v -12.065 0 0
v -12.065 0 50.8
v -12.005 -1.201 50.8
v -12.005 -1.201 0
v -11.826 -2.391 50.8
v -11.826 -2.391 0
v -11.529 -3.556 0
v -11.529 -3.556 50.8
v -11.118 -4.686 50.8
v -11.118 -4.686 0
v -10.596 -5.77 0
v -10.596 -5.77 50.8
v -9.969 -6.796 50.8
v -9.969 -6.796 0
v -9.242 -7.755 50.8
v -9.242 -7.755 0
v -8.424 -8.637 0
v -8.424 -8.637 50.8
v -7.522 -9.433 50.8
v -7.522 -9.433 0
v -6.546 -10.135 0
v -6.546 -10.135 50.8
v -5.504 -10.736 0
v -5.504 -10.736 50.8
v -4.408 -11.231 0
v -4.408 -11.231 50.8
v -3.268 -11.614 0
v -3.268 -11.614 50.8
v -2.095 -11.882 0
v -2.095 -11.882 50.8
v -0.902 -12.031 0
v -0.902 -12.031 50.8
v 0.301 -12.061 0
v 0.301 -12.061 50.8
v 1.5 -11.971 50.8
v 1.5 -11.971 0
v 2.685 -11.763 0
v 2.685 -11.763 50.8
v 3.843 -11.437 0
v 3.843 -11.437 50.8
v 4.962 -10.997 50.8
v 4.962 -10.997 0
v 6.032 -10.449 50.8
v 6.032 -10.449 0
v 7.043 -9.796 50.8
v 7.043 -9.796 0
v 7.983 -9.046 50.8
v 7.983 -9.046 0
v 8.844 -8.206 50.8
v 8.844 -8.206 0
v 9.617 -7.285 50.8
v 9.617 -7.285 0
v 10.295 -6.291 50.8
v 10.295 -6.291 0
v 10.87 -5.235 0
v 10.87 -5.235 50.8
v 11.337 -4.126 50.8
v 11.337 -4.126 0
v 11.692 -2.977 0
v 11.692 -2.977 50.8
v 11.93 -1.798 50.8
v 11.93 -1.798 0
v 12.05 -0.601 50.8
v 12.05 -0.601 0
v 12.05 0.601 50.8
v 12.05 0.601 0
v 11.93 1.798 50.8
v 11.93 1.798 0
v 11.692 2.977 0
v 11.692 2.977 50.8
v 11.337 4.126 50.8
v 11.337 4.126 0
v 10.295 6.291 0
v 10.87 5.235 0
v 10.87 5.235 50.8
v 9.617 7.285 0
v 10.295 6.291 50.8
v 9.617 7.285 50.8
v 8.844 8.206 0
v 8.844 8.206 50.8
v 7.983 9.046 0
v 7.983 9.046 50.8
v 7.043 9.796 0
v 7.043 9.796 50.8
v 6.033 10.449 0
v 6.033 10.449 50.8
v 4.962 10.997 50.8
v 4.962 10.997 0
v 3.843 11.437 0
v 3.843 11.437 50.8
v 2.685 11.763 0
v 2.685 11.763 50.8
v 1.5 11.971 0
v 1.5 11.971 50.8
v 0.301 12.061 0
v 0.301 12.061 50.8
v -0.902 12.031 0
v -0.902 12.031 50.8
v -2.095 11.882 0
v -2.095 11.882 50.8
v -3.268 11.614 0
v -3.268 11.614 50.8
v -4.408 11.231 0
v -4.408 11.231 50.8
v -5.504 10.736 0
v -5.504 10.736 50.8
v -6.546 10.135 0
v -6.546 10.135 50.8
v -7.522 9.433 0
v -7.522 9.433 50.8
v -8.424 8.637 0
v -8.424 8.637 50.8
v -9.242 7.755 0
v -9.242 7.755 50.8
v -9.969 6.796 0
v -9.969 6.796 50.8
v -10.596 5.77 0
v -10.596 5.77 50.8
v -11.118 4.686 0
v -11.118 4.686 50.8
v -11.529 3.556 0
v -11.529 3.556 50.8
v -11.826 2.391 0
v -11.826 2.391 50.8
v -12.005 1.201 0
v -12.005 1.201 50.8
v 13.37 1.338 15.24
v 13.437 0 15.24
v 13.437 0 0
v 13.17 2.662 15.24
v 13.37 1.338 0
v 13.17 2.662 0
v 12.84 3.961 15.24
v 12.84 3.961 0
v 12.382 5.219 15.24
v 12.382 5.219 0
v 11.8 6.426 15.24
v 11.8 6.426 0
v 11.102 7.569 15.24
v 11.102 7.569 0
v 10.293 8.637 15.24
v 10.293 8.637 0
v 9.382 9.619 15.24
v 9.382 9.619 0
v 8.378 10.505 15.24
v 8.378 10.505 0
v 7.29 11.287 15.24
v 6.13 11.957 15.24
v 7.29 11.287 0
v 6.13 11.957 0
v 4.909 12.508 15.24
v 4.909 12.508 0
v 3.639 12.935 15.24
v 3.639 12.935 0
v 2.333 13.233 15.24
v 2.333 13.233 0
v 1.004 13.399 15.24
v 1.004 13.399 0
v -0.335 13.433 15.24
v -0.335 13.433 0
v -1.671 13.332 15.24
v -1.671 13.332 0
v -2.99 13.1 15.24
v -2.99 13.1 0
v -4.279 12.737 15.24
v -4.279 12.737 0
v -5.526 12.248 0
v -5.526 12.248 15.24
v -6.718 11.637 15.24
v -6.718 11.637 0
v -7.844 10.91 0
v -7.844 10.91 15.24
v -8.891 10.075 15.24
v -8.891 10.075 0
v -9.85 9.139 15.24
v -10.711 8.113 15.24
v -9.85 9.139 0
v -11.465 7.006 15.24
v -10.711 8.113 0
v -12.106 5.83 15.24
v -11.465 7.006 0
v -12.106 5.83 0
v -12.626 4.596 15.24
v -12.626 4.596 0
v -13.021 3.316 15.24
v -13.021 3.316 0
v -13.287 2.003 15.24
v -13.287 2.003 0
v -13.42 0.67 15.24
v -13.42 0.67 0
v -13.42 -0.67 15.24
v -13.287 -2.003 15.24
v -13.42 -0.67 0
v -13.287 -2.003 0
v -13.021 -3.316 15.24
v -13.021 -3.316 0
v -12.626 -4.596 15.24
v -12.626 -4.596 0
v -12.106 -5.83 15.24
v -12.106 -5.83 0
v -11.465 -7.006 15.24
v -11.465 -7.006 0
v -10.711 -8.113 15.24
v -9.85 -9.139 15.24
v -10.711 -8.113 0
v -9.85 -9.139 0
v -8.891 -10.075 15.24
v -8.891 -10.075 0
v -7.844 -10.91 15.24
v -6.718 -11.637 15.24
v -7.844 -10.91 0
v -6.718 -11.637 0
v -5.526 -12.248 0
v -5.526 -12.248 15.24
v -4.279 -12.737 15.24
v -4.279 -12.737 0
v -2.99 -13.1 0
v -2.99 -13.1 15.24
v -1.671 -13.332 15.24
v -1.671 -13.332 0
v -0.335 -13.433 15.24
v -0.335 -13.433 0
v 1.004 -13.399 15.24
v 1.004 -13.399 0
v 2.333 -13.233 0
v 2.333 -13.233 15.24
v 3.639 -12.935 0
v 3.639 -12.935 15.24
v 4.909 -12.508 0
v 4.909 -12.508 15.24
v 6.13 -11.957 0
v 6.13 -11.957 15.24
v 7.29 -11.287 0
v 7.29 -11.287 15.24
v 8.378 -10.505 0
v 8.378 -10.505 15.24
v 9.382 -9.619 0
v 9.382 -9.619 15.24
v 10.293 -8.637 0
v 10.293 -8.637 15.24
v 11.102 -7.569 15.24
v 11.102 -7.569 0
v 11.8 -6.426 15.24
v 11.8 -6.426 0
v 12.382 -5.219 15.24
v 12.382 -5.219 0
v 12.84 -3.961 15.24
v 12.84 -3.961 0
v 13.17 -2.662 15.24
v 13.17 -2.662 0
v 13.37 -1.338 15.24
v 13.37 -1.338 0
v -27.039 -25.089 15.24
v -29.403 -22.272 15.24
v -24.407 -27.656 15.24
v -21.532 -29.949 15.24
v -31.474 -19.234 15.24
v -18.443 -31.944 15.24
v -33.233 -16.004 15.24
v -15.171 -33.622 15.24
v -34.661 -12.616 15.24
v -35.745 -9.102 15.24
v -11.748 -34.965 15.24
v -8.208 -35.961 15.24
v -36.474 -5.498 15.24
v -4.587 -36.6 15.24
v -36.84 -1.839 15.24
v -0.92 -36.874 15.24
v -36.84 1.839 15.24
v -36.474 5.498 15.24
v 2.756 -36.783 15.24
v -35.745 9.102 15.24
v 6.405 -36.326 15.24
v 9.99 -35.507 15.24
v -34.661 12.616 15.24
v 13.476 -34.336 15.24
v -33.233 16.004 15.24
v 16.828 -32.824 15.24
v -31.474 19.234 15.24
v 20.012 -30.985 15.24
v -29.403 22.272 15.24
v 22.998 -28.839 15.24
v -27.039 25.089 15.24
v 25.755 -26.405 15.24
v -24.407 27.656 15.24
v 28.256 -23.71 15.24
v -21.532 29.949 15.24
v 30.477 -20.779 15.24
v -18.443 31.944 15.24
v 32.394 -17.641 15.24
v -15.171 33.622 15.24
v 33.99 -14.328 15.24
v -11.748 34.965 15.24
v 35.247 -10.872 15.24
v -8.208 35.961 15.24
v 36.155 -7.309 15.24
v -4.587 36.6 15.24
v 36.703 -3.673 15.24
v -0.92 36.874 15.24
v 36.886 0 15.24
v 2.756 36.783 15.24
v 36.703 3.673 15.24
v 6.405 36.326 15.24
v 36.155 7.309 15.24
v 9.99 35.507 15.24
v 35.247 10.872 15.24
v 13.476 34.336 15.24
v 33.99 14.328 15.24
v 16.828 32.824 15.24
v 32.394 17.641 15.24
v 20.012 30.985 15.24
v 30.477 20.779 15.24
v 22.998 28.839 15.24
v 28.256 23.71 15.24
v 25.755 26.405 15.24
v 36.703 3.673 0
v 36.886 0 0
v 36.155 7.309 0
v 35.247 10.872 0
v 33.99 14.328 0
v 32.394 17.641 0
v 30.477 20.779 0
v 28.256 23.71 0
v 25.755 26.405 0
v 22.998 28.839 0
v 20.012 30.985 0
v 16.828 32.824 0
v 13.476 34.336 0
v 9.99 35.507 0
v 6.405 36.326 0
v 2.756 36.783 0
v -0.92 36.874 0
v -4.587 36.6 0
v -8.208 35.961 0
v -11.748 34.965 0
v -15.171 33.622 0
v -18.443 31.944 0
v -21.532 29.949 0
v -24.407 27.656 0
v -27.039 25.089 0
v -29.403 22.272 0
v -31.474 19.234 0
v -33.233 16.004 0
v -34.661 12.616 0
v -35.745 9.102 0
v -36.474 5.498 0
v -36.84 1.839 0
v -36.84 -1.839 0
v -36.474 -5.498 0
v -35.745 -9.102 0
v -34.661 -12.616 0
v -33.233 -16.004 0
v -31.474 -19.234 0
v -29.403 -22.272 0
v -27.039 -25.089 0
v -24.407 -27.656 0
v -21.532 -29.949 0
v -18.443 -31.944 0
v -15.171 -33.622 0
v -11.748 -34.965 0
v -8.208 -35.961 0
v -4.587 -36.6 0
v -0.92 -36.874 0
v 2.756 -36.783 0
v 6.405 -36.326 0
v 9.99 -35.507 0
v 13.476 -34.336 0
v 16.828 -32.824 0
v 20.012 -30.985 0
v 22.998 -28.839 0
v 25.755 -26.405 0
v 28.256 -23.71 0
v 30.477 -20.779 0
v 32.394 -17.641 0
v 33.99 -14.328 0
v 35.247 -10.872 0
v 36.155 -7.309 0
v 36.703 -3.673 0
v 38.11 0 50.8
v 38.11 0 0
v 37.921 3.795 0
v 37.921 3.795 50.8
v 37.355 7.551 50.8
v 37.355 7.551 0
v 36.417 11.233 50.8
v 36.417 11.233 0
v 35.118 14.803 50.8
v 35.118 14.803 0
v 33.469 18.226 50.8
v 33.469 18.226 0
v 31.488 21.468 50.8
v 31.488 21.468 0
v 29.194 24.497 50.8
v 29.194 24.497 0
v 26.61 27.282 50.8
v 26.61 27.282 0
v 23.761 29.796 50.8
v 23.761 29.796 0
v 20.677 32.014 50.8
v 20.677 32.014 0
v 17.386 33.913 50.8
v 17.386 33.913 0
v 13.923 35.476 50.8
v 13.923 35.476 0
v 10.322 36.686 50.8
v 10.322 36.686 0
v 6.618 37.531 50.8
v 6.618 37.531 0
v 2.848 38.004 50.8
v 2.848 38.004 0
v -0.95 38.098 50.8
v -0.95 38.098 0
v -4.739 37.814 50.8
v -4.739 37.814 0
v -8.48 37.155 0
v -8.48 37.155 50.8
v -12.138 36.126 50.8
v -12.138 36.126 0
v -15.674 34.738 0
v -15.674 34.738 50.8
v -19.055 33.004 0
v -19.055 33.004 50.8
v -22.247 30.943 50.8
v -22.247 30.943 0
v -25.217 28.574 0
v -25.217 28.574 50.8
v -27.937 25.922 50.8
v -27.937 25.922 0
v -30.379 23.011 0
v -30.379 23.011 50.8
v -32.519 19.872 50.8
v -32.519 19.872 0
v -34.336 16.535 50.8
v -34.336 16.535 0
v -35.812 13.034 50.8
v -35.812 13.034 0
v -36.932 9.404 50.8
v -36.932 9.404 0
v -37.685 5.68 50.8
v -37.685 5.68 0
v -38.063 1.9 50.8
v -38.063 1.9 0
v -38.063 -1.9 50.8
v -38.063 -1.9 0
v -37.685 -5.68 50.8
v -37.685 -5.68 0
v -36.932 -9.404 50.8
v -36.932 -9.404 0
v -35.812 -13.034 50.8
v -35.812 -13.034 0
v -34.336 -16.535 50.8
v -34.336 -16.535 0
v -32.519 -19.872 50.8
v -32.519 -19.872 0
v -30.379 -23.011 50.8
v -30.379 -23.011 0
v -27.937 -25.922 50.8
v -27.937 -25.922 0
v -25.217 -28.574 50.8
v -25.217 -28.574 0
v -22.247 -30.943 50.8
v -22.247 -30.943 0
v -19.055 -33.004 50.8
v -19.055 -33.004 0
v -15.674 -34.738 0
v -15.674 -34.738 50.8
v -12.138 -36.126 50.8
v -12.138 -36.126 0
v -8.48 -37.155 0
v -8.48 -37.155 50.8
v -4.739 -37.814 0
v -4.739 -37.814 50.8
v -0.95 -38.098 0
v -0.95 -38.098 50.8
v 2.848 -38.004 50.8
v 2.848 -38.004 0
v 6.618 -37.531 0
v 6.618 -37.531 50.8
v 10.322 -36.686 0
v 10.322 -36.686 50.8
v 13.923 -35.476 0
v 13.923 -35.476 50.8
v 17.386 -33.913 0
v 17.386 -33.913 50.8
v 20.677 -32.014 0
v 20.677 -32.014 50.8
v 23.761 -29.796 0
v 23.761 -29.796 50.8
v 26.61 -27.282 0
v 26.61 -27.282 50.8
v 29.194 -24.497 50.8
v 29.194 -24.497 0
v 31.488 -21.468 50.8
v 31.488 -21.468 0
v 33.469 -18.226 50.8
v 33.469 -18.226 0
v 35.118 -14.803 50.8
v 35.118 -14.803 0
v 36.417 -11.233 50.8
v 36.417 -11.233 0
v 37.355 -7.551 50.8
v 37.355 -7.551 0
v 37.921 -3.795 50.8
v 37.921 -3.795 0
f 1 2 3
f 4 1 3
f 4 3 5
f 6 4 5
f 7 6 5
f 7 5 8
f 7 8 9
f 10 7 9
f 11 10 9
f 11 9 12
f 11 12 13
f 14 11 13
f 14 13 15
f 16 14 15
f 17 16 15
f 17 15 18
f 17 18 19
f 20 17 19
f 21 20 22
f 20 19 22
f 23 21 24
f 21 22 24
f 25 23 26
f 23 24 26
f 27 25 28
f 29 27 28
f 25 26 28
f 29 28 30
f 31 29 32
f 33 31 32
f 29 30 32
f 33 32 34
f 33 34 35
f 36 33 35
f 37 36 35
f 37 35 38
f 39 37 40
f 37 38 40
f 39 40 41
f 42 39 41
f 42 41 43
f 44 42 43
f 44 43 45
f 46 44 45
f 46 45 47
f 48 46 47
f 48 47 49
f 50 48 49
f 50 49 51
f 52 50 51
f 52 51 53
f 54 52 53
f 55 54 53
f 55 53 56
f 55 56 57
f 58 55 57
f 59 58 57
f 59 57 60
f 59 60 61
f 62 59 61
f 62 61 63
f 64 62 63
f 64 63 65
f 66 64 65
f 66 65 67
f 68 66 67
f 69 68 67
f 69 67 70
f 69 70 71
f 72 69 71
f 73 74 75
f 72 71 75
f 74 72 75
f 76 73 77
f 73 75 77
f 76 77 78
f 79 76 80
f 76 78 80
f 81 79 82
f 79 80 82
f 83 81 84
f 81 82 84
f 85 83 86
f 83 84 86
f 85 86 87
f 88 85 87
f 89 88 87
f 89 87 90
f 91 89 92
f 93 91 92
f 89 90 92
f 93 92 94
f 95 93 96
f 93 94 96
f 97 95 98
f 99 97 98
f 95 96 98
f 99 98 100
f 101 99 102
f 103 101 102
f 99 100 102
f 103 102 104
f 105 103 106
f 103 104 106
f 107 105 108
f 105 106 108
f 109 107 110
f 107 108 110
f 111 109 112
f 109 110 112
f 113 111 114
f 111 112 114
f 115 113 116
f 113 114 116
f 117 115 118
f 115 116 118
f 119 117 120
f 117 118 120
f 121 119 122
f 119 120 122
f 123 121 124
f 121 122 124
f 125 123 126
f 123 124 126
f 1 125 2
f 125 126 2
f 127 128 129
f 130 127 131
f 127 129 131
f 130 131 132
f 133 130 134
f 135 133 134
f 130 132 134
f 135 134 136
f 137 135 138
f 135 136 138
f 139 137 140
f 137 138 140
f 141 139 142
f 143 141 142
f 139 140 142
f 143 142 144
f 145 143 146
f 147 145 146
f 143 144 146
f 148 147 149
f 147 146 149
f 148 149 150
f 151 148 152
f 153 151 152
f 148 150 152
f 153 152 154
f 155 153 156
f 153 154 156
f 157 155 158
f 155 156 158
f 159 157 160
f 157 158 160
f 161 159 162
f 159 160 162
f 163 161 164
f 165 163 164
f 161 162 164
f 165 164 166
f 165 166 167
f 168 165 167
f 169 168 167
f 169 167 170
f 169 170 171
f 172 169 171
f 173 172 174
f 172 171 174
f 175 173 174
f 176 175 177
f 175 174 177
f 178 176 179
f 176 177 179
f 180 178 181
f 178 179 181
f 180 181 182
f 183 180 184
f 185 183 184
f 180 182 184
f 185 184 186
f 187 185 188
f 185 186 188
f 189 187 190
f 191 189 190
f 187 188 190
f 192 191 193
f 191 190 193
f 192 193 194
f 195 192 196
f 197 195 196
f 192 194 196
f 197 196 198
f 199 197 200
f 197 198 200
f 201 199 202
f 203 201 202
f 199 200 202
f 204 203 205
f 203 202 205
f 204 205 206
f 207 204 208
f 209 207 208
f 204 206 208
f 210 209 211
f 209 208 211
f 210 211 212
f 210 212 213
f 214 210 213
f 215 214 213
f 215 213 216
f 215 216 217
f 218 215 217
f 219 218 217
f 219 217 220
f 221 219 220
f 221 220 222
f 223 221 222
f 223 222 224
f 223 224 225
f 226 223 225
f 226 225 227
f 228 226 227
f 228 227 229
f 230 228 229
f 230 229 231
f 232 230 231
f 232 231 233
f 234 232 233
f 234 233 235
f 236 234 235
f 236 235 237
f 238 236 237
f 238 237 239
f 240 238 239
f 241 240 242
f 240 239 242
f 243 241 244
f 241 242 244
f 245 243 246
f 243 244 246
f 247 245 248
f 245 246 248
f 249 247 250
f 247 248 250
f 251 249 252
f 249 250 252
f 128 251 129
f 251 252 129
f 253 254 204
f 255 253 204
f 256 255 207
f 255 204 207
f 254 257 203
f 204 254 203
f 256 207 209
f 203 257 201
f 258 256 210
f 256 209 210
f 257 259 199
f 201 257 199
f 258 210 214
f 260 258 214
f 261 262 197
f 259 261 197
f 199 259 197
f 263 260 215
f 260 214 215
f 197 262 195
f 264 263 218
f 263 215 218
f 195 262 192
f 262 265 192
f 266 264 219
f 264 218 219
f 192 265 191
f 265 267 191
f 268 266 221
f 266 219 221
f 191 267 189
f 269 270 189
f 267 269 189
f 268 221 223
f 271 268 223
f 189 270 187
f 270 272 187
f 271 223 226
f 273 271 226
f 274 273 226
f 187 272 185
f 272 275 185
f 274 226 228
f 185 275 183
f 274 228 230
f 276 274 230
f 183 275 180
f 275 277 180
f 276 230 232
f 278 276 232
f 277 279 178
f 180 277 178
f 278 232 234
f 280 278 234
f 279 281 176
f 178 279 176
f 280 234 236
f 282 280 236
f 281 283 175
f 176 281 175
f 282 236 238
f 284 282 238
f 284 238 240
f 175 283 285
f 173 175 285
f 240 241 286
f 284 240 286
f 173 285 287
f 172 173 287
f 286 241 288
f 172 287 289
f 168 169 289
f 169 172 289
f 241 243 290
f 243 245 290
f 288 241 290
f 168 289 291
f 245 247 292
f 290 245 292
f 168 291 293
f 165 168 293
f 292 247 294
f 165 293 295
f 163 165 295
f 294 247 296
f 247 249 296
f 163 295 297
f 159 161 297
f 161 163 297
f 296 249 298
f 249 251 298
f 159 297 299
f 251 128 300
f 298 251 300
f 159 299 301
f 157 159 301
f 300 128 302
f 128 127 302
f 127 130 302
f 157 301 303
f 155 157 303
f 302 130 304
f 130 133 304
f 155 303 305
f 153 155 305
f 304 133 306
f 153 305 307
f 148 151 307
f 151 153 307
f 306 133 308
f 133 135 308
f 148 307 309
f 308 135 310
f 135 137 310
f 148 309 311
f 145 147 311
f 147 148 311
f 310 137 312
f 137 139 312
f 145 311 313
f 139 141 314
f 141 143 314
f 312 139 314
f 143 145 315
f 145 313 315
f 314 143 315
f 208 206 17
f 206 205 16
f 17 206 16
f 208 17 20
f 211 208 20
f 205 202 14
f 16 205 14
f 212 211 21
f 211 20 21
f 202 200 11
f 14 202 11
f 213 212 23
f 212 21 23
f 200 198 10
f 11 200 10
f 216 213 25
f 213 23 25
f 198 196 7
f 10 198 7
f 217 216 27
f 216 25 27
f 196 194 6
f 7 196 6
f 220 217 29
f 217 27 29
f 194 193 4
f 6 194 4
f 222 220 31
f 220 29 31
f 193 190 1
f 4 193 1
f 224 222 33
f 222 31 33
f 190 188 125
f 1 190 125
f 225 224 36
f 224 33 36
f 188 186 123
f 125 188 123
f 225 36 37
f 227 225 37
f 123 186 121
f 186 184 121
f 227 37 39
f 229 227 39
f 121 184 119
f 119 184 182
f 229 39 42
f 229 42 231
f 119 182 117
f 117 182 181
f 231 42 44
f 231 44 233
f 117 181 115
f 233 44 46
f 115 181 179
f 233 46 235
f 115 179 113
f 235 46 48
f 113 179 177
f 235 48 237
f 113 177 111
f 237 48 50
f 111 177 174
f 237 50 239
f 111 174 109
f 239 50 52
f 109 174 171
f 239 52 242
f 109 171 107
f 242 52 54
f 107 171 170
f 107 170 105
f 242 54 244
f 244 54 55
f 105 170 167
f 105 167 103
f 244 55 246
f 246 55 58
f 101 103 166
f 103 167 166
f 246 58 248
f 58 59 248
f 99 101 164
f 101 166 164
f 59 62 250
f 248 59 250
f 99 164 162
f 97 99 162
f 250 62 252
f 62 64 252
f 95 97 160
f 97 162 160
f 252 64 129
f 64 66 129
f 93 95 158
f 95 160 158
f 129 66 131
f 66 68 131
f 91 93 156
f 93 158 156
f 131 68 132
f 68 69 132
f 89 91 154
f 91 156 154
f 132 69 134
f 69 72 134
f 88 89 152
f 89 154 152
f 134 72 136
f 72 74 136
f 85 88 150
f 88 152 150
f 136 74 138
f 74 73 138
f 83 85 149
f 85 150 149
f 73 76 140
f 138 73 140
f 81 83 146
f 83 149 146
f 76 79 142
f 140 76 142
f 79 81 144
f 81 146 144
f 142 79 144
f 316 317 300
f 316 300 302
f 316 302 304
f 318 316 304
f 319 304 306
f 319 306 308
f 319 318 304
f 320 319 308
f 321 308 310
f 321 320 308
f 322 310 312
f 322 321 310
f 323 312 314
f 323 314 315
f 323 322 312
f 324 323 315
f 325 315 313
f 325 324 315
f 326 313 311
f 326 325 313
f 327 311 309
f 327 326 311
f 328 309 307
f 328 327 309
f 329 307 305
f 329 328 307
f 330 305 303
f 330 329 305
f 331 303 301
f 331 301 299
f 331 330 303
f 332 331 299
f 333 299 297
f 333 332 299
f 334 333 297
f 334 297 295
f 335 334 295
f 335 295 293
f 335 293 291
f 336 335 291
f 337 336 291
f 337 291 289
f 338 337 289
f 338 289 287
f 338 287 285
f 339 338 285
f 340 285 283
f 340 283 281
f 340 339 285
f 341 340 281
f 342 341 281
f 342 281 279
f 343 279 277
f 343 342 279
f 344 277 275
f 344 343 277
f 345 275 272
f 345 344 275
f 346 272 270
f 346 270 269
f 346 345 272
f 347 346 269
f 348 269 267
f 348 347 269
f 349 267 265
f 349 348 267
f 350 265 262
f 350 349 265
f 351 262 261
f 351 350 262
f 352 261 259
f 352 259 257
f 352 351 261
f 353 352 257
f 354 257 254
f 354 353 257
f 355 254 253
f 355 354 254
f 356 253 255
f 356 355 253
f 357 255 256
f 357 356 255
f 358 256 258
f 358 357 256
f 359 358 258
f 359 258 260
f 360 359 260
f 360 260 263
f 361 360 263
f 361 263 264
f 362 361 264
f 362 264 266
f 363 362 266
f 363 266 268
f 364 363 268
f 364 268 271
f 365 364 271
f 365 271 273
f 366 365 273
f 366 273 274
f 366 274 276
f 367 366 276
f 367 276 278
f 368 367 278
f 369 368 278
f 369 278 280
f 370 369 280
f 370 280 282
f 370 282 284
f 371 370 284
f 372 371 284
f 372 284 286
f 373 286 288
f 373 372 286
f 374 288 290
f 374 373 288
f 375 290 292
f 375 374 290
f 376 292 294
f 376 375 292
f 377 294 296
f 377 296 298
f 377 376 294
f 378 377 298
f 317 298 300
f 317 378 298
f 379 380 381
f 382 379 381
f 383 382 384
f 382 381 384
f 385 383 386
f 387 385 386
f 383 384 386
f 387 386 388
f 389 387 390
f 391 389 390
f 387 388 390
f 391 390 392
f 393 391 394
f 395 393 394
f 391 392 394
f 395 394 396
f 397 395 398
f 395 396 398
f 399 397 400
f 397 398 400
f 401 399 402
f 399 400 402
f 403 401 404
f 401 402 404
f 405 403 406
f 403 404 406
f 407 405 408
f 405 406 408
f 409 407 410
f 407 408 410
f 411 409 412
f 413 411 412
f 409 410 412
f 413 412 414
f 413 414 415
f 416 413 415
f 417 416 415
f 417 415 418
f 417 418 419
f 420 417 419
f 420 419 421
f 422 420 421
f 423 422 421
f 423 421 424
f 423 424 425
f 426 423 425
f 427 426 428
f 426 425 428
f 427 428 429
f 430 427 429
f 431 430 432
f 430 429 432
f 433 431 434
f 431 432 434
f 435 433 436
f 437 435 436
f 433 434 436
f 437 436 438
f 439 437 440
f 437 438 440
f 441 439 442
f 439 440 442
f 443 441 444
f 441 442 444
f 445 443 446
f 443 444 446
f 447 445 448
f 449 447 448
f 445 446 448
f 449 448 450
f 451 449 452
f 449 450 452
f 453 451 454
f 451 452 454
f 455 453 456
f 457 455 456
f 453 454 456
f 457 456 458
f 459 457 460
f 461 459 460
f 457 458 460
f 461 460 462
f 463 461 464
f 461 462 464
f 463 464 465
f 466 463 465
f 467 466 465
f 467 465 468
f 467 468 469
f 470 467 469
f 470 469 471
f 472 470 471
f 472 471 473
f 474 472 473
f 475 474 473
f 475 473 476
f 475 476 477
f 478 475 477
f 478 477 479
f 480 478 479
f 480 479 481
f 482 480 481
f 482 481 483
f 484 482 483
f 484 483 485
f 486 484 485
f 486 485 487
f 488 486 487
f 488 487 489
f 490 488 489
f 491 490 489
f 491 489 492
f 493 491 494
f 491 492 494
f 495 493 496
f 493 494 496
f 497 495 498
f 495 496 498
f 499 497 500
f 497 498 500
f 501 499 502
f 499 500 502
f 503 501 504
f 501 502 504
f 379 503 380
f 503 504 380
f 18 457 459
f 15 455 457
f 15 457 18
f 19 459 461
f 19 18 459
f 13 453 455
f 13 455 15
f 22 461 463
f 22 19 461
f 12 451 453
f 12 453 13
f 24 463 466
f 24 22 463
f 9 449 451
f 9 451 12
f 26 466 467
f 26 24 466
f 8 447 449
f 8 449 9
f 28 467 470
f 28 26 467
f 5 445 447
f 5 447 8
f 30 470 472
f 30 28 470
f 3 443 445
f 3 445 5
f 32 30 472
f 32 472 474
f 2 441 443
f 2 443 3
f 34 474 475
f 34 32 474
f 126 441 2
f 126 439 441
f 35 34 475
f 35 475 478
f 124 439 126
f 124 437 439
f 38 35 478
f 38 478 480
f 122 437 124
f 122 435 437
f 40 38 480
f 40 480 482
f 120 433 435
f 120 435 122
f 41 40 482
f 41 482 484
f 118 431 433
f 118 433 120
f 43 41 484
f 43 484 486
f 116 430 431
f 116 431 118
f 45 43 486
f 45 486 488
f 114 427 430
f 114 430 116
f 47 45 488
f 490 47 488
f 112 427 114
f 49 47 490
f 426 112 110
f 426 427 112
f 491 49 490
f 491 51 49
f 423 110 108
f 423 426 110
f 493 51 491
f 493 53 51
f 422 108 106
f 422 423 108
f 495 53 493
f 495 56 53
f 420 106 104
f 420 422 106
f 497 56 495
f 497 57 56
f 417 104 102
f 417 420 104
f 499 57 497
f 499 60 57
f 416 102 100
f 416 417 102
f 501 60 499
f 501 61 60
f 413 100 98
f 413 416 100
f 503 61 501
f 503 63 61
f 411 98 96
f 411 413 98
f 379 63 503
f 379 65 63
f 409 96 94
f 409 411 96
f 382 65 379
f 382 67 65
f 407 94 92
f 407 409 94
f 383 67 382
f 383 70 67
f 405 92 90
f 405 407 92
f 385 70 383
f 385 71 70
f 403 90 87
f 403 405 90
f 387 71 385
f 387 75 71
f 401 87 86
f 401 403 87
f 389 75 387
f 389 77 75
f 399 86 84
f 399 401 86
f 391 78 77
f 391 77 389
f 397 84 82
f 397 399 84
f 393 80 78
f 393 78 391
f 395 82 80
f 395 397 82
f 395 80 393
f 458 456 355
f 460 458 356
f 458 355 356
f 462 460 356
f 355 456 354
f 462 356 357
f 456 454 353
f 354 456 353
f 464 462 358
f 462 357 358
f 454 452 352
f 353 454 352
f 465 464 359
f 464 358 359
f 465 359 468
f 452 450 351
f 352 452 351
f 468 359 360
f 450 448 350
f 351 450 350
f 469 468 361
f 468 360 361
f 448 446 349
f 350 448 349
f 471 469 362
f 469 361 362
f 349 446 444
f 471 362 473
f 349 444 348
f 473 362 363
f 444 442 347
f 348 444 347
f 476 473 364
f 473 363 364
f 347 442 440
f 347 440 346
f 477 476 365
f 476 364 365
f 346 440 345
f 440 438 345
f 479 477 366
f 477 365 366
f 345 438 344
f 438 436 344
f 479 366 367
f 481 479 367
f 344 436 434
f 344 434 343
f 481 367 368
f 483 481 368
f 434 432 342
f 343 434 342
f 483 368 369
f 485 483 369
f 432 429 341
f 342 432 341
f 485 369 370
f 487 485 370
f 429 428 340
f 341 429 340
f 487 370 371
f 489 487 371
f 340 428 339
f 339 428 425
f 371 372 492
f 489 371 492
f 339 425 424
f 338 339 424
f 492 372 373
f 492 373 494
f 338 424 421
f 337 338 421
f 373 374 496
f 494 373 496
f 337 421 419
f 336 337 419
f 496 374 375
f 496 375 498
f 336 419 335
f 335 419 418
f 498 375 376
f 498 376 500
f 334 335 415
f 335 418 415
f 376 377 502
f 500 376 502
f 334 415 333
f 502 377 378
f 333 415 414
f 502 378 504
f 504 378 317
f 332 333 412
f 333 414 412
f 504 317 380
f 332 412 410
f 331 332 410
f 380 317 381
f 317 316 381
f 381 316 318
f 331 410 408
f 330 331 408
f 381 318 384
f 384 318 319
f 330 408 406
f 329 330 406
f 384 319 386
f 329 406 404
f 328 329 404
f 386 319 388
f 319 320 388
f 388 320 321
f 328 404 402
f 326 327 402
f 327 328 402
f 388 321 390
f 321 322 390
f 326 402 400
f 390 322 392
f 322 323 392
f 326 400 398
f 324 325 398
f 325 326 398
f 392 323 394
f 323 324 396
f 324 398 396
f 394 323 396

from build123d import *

# Parameters (mm, degrees)
F0_R     = 38.110254
F1_DEPTH = 50.8
F2_R     = 36.885963
F2_R_2   = 13.436762
F3_DEPTH = 15.24
F5_D     = 24.13


with BuildPart() as f1:
    # F0 (on Top) → F1 (new body)
    with BuildSketch(Plane.XY):
        Circle(F0_R)
    extrude(amount=F1_DEPTH)

    # F2 (on Top) → F3 (cut)
    with BuildSketch(Plane.XY):
        Circle(F2_R)
        Circle(F2_R_2, mode=Mode.SUBTRACT)
    extrude(amount=F3_DEPTH, mode=Mode.SUBTRACT)

    # F5 (through all)
    with Locations(Plane(origin=(0, 0, 0), x_dir=(1, 0, 0), z_dir=(0, 0, -1))):
        with Locations((0, 0)):
            Hole(F5_D / 2)


solid = f1.part
